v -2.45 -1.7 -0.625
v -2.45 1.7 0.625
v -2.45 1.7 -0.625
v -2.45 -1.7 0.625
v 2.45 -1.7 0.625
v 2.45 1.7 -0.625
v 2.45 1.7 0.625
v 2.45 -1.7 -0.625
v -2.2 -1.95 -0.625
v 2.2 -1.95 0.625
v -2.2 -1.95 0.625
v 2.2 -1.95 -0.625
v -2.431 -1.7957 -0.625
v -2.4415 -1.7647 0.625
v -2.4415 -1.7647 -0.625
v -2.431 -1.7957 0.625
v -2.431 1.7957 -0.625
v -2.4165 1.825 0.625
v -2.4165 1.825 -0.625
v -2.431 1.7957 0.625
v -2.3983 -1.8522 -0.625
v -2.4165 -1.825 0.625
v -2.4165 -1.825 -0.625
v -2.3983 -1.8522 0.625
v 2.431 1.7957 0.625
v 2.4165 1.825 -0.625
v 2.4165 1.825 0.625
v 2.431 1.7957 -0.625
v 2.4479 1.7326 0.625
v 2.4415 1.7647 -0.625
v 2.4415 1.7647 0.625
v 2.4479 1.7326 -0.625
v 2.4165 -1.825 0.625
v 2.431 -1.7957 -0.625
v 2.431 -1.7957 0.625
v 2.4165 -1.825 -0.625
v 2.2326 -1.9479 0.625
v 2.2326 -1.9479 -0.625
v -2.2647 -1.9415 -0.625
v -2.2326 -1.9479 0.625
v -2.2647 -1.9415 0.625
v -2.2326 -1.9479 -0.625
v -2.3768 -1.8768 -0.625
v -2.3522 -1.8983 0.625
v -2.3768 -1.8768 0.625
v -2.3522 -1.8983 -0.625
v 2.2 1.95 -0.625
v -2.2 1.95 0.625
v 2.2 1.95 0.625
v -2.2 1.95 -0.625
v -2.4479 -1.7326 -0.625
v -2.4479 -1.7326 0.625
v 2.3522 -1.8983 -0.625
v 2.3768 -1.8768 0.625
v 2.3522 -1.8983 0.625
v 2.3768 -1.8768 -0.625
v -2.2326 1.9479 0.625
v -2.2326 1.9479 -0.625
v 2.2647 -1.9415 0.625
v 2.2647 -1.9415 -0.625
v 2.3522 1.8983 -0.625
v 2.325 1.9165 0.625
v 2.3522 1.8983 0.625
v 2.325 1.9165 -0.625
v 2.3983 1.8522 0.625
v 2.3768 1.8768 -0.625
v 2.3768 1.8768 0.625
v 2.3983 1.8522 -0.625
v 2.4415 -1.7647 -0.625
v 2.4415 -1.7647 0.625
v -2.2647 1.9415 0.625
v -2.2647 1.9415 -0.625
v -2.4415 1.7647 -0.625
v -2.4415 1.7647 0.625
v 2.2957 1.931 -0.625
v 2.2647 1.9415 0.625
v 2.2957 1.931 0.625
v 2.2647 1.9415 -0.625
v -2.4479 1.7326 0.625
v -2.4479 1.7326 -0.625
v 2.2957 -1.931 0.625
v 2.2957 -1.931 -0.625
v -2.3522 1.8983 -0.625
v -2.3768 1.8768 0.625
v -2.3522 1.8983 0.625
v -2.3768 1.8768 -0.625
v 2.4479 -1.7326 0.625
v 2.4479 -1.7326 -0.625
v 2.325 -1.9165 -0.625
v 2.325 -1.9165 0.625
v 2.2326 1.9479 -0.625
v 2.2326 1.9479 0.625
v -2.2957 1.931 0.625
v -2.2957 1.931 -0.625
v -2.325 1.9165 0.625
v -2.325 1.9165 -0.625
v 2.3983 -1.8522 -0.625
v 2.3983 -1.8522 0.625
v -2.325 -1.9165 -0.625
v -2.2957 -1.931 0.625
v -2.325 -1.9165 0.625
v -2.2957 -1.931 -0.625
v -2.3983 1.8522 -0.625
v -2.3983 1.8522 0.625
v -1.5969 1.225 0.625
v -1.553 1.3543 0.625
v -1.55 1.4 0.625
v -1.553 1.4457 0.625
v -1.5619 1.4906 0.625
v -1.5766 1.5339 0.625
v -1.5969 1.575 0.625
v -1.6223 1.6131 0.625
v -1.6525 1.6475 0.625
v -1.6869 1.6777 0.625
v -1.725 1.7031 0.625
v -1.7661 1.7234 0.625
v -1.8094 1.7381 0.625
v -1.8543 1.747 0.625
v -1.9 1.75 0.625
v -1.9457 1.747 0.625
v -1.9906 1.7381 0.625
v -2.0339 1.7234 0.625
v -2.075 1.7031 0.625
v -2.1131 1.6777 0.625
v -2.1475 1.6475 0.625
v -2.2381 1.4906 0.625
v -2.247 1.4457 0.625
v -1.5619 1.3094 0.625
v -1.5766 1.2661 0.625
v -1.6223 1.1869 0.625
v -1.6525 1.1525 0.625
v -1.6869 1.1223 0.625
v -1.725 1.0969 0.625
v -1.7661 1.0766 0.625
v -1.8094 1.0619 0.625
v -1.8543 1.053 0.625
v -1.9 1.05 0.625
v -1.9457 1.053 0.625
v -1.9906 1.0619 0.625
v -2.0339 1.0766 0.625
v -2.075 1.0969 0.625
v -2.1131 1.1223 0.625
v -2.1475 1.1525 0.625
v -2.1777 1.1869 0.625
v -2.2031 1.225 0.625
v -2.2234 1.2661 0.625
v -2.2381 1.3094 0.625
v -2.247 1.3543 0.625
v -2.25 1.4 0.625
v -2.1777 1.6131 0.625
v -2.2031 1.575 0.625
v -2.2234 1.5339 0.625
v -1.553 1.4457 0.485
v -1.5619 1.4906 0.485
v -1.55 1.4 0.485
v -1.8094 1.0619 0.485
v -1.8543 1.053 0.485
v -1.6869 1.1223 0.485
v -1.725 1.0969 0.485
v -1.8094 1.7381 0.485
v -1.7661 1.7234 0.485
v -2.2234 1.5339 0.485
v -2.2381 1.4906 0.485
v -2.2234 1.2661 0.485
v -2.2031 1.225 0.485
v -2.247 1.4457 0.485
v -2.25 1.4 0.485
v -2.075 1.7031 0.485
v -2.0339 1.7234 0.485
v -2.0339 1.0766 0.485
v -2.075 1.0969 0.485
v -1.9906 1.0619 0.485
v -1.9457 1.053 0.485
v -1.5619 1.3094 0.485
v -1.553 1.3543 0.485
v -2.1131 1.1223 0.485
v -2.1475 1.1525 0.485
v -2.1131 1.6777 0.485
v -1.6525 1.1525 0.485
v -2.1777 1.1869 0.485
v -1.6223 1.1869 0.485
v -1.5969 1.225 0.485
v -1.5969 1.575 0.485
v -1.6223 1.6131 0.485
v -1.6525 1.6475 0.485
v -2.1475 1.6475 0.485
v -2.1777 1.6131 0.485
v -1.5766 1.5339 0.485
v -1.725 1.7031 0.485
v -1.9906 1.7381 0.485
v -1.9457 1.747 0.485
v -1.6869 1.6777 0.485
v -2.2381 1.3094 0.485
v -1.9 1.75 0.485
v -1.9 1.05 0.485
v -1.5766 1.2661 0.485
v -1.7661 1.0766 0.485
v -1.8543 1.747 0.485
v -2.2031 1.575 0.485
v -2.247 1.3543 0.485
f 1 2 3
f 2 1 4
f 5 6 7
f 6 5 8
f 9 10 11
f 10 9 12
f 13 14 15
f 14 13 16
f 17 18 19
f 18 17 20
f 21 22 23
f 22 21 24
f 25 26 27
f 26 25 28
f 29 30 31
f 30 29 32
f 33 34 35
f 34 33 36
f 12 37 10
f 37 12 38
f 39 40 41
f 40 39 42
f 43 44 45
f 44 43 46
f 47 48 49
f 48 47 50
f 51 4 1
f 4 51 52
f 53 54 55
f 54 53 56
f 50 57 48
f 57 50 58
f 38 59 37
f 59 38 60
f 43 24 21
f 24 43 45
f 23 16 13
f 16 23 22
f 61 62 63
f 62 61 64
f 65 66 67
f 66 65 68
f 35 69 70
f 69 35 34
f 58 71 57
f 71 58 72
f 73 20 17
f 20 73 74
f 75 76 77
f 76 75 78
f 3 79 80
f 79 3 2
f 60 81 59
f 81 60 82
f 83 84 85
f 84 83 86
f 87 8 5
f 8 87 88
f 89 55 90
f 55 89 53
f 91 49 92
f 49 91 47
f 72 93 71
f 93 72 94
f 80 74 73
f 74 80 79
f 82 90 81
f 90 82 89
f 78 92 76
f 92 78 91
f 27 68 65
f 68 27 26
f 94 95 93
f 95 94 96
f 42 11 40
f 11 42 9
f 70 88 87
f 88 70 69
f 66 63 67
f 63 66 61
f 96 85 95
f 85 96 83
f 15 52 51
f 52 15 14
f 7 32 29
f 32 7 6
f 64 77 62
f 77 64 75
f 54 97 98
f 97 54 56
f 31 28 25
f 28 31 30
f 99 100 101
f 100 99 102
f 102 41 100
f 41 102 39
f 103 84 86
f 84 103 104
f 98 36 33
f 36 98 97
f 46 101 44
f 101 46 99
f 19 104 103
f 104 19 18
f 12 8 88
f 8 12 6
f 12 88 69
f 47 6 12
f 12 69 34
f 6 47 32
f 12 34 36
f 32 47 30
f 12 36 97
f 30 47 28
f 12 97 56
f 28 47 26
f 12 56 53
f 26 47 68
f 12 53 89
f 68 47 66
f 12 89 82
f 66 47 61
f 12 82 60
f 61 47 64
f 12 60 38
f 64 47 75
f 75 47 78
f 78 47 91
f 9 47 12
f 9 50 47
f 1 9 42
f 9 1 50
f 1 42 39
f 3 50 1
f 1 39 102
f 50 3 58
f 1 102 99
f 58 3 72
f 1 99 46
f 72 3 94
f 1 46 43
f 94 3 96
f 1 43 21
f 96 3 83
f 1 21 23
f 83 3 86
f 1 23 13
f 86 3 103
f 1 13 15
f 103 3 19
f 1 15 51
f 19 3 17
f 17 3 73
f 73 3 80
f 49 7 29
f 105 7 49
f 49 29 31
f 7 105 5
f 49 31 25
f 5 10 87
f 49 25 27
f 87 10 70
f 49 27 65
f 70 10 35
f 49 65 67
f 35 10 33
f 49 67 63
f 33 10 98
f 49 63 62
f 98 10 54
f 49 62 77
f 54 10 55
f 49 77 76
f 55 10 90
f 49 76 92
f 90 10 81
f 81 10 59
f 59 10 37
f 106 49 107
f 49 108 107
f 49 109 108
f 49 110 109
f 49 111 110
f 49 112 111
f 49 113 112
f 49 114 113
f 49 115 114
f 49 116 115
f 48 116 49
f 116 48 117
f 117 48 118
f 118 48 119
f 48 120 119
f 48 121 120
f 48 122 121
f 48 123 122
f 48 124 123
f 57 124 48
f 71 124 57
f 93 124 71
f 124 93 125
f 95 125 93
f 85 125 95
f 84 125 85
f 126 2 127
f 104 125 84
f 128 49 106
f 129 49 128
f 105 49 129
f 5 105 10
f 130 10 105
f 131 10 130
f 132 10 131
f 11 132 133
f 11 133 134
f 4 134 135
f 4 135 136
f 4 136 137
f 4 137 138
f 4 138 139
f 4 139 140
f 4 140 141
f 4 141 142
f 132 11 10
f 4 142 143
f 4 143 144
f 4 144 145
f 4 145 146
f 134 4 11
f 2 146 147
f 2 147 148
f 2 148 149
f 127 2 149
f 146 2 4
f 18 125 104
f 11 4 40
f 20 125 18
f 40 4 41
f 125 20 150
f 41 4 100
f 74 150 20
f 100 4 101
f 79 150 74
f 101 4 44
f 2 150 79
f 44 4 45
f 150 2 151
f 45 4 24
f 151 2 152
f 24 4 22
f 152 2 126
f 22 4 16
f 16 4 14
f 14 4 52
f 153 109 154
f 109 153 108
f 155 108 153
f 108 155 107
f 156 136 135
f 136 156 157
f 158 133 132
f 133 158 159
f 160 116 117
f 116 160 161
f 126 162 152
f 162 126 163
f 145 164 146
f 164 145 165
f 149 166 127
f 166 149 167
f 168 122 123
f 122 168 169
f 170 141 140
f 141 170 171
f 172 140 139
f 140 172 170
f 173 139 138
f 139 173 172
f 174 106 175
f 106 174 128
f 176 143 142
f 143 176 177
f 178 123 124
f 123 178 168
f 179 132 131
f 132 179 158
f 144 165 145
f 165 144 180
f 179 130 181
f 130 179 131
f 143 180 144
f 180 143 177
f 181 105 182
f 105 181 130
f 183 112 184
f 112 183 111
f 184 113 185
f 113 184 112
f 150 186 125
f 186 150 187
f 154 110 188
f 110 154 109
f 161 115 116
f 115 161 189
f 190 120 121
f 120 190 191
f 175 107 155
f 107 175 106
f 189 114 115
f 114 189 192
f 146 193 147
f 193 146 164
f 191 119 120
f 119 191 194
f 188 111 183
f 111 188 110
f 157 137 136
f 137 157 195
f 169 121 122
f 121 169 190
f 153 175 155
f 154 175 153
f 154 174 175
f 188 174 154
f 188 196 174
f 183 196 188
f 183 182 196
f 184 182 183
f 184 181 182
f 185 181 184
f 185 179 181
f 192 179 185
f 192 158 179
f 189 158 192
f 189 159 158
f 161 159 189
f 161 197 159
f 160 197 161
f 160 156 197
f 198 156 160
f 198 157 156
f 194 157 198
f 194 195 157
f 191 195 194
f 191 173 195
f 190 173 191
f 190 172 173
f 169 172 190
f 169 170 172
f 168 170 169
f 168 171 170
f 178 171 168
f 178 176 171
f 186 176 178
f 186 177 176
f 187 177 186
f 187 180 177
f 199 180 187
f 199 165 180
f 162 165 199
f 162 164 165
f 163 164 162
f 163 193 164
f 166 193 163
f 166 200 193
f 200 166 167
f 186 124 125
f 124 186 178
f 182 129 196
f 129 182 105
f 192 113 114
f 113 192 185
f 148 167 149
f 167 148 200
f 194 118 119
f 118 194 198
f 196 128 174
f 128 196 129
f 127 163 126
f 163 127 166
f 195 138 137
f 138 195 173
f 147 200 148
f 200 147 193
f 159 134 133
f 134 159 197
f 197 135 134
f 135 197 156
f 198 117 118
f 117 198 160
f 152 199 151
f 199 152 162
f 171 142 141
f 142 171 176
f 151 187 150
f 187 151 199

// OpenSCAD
// Simple SMD package (single connected solid) sized exactly: [4.90, 3.90, 1.25]

// Dimensions (mm)
body_L = 4.90;
body_W = 3.90;
body_H = 1.25;

// Small cosmetic features (kept subtle; do not change overall size)
corner_r = 0.25;          // corner rounding radius
pin1_r   = 0.35;          // pin-1 dimple radius
pin1_d   = 0.12;          // pin-1 dimple depth (into top)
mark_L   = body_L/4;      // top marking pad size
mark_W   = body_W/4;
mark_h   = body_H/25;     // very thin raised pad
edge_m   = 0.55;          // pin-1 offset from edges
eps      = 0.02;          // small overlap to ensure watertight unions/differences

$fn = 48;

// Rounded-rectangle prism using hull of cylinders (robust, always visible)
module rounded_box(L, W, H, r) {
    r2 = min(r, min(L, W)/2 - 0.001);
    hull() {
        for (sx = [-1, 1], sy = [-1, 1])
            translate([sx*(L/2 - r2), sy*(W/2 - r2), 0])
                cylinder(h=H, r=r2, center=true);
    }
}

module smd() {
    union() {
        // Main body with pin-1 dimple and a small top pad marking
        difference() {
            rounded_box(body_L, body_W, body_H, corner_r);

            // Pin-1 dimple (subtracted from top surface)
            translate([
                -body_L/2 + edge_m,
                 body_W/2 - edge_m,
                 body_H/2 - pin1_d/2
            ])
                cylinder(h=pin1_d + 2*eps, r=pin1_r, center=true);
        }

        // Small raised top marking pad (kept within the top face)
        translate([0, 0, body_H/2 - mark_h/2])
            cube([mark_L, mark_W, mark_h], center=true);
    }
}

smd();
